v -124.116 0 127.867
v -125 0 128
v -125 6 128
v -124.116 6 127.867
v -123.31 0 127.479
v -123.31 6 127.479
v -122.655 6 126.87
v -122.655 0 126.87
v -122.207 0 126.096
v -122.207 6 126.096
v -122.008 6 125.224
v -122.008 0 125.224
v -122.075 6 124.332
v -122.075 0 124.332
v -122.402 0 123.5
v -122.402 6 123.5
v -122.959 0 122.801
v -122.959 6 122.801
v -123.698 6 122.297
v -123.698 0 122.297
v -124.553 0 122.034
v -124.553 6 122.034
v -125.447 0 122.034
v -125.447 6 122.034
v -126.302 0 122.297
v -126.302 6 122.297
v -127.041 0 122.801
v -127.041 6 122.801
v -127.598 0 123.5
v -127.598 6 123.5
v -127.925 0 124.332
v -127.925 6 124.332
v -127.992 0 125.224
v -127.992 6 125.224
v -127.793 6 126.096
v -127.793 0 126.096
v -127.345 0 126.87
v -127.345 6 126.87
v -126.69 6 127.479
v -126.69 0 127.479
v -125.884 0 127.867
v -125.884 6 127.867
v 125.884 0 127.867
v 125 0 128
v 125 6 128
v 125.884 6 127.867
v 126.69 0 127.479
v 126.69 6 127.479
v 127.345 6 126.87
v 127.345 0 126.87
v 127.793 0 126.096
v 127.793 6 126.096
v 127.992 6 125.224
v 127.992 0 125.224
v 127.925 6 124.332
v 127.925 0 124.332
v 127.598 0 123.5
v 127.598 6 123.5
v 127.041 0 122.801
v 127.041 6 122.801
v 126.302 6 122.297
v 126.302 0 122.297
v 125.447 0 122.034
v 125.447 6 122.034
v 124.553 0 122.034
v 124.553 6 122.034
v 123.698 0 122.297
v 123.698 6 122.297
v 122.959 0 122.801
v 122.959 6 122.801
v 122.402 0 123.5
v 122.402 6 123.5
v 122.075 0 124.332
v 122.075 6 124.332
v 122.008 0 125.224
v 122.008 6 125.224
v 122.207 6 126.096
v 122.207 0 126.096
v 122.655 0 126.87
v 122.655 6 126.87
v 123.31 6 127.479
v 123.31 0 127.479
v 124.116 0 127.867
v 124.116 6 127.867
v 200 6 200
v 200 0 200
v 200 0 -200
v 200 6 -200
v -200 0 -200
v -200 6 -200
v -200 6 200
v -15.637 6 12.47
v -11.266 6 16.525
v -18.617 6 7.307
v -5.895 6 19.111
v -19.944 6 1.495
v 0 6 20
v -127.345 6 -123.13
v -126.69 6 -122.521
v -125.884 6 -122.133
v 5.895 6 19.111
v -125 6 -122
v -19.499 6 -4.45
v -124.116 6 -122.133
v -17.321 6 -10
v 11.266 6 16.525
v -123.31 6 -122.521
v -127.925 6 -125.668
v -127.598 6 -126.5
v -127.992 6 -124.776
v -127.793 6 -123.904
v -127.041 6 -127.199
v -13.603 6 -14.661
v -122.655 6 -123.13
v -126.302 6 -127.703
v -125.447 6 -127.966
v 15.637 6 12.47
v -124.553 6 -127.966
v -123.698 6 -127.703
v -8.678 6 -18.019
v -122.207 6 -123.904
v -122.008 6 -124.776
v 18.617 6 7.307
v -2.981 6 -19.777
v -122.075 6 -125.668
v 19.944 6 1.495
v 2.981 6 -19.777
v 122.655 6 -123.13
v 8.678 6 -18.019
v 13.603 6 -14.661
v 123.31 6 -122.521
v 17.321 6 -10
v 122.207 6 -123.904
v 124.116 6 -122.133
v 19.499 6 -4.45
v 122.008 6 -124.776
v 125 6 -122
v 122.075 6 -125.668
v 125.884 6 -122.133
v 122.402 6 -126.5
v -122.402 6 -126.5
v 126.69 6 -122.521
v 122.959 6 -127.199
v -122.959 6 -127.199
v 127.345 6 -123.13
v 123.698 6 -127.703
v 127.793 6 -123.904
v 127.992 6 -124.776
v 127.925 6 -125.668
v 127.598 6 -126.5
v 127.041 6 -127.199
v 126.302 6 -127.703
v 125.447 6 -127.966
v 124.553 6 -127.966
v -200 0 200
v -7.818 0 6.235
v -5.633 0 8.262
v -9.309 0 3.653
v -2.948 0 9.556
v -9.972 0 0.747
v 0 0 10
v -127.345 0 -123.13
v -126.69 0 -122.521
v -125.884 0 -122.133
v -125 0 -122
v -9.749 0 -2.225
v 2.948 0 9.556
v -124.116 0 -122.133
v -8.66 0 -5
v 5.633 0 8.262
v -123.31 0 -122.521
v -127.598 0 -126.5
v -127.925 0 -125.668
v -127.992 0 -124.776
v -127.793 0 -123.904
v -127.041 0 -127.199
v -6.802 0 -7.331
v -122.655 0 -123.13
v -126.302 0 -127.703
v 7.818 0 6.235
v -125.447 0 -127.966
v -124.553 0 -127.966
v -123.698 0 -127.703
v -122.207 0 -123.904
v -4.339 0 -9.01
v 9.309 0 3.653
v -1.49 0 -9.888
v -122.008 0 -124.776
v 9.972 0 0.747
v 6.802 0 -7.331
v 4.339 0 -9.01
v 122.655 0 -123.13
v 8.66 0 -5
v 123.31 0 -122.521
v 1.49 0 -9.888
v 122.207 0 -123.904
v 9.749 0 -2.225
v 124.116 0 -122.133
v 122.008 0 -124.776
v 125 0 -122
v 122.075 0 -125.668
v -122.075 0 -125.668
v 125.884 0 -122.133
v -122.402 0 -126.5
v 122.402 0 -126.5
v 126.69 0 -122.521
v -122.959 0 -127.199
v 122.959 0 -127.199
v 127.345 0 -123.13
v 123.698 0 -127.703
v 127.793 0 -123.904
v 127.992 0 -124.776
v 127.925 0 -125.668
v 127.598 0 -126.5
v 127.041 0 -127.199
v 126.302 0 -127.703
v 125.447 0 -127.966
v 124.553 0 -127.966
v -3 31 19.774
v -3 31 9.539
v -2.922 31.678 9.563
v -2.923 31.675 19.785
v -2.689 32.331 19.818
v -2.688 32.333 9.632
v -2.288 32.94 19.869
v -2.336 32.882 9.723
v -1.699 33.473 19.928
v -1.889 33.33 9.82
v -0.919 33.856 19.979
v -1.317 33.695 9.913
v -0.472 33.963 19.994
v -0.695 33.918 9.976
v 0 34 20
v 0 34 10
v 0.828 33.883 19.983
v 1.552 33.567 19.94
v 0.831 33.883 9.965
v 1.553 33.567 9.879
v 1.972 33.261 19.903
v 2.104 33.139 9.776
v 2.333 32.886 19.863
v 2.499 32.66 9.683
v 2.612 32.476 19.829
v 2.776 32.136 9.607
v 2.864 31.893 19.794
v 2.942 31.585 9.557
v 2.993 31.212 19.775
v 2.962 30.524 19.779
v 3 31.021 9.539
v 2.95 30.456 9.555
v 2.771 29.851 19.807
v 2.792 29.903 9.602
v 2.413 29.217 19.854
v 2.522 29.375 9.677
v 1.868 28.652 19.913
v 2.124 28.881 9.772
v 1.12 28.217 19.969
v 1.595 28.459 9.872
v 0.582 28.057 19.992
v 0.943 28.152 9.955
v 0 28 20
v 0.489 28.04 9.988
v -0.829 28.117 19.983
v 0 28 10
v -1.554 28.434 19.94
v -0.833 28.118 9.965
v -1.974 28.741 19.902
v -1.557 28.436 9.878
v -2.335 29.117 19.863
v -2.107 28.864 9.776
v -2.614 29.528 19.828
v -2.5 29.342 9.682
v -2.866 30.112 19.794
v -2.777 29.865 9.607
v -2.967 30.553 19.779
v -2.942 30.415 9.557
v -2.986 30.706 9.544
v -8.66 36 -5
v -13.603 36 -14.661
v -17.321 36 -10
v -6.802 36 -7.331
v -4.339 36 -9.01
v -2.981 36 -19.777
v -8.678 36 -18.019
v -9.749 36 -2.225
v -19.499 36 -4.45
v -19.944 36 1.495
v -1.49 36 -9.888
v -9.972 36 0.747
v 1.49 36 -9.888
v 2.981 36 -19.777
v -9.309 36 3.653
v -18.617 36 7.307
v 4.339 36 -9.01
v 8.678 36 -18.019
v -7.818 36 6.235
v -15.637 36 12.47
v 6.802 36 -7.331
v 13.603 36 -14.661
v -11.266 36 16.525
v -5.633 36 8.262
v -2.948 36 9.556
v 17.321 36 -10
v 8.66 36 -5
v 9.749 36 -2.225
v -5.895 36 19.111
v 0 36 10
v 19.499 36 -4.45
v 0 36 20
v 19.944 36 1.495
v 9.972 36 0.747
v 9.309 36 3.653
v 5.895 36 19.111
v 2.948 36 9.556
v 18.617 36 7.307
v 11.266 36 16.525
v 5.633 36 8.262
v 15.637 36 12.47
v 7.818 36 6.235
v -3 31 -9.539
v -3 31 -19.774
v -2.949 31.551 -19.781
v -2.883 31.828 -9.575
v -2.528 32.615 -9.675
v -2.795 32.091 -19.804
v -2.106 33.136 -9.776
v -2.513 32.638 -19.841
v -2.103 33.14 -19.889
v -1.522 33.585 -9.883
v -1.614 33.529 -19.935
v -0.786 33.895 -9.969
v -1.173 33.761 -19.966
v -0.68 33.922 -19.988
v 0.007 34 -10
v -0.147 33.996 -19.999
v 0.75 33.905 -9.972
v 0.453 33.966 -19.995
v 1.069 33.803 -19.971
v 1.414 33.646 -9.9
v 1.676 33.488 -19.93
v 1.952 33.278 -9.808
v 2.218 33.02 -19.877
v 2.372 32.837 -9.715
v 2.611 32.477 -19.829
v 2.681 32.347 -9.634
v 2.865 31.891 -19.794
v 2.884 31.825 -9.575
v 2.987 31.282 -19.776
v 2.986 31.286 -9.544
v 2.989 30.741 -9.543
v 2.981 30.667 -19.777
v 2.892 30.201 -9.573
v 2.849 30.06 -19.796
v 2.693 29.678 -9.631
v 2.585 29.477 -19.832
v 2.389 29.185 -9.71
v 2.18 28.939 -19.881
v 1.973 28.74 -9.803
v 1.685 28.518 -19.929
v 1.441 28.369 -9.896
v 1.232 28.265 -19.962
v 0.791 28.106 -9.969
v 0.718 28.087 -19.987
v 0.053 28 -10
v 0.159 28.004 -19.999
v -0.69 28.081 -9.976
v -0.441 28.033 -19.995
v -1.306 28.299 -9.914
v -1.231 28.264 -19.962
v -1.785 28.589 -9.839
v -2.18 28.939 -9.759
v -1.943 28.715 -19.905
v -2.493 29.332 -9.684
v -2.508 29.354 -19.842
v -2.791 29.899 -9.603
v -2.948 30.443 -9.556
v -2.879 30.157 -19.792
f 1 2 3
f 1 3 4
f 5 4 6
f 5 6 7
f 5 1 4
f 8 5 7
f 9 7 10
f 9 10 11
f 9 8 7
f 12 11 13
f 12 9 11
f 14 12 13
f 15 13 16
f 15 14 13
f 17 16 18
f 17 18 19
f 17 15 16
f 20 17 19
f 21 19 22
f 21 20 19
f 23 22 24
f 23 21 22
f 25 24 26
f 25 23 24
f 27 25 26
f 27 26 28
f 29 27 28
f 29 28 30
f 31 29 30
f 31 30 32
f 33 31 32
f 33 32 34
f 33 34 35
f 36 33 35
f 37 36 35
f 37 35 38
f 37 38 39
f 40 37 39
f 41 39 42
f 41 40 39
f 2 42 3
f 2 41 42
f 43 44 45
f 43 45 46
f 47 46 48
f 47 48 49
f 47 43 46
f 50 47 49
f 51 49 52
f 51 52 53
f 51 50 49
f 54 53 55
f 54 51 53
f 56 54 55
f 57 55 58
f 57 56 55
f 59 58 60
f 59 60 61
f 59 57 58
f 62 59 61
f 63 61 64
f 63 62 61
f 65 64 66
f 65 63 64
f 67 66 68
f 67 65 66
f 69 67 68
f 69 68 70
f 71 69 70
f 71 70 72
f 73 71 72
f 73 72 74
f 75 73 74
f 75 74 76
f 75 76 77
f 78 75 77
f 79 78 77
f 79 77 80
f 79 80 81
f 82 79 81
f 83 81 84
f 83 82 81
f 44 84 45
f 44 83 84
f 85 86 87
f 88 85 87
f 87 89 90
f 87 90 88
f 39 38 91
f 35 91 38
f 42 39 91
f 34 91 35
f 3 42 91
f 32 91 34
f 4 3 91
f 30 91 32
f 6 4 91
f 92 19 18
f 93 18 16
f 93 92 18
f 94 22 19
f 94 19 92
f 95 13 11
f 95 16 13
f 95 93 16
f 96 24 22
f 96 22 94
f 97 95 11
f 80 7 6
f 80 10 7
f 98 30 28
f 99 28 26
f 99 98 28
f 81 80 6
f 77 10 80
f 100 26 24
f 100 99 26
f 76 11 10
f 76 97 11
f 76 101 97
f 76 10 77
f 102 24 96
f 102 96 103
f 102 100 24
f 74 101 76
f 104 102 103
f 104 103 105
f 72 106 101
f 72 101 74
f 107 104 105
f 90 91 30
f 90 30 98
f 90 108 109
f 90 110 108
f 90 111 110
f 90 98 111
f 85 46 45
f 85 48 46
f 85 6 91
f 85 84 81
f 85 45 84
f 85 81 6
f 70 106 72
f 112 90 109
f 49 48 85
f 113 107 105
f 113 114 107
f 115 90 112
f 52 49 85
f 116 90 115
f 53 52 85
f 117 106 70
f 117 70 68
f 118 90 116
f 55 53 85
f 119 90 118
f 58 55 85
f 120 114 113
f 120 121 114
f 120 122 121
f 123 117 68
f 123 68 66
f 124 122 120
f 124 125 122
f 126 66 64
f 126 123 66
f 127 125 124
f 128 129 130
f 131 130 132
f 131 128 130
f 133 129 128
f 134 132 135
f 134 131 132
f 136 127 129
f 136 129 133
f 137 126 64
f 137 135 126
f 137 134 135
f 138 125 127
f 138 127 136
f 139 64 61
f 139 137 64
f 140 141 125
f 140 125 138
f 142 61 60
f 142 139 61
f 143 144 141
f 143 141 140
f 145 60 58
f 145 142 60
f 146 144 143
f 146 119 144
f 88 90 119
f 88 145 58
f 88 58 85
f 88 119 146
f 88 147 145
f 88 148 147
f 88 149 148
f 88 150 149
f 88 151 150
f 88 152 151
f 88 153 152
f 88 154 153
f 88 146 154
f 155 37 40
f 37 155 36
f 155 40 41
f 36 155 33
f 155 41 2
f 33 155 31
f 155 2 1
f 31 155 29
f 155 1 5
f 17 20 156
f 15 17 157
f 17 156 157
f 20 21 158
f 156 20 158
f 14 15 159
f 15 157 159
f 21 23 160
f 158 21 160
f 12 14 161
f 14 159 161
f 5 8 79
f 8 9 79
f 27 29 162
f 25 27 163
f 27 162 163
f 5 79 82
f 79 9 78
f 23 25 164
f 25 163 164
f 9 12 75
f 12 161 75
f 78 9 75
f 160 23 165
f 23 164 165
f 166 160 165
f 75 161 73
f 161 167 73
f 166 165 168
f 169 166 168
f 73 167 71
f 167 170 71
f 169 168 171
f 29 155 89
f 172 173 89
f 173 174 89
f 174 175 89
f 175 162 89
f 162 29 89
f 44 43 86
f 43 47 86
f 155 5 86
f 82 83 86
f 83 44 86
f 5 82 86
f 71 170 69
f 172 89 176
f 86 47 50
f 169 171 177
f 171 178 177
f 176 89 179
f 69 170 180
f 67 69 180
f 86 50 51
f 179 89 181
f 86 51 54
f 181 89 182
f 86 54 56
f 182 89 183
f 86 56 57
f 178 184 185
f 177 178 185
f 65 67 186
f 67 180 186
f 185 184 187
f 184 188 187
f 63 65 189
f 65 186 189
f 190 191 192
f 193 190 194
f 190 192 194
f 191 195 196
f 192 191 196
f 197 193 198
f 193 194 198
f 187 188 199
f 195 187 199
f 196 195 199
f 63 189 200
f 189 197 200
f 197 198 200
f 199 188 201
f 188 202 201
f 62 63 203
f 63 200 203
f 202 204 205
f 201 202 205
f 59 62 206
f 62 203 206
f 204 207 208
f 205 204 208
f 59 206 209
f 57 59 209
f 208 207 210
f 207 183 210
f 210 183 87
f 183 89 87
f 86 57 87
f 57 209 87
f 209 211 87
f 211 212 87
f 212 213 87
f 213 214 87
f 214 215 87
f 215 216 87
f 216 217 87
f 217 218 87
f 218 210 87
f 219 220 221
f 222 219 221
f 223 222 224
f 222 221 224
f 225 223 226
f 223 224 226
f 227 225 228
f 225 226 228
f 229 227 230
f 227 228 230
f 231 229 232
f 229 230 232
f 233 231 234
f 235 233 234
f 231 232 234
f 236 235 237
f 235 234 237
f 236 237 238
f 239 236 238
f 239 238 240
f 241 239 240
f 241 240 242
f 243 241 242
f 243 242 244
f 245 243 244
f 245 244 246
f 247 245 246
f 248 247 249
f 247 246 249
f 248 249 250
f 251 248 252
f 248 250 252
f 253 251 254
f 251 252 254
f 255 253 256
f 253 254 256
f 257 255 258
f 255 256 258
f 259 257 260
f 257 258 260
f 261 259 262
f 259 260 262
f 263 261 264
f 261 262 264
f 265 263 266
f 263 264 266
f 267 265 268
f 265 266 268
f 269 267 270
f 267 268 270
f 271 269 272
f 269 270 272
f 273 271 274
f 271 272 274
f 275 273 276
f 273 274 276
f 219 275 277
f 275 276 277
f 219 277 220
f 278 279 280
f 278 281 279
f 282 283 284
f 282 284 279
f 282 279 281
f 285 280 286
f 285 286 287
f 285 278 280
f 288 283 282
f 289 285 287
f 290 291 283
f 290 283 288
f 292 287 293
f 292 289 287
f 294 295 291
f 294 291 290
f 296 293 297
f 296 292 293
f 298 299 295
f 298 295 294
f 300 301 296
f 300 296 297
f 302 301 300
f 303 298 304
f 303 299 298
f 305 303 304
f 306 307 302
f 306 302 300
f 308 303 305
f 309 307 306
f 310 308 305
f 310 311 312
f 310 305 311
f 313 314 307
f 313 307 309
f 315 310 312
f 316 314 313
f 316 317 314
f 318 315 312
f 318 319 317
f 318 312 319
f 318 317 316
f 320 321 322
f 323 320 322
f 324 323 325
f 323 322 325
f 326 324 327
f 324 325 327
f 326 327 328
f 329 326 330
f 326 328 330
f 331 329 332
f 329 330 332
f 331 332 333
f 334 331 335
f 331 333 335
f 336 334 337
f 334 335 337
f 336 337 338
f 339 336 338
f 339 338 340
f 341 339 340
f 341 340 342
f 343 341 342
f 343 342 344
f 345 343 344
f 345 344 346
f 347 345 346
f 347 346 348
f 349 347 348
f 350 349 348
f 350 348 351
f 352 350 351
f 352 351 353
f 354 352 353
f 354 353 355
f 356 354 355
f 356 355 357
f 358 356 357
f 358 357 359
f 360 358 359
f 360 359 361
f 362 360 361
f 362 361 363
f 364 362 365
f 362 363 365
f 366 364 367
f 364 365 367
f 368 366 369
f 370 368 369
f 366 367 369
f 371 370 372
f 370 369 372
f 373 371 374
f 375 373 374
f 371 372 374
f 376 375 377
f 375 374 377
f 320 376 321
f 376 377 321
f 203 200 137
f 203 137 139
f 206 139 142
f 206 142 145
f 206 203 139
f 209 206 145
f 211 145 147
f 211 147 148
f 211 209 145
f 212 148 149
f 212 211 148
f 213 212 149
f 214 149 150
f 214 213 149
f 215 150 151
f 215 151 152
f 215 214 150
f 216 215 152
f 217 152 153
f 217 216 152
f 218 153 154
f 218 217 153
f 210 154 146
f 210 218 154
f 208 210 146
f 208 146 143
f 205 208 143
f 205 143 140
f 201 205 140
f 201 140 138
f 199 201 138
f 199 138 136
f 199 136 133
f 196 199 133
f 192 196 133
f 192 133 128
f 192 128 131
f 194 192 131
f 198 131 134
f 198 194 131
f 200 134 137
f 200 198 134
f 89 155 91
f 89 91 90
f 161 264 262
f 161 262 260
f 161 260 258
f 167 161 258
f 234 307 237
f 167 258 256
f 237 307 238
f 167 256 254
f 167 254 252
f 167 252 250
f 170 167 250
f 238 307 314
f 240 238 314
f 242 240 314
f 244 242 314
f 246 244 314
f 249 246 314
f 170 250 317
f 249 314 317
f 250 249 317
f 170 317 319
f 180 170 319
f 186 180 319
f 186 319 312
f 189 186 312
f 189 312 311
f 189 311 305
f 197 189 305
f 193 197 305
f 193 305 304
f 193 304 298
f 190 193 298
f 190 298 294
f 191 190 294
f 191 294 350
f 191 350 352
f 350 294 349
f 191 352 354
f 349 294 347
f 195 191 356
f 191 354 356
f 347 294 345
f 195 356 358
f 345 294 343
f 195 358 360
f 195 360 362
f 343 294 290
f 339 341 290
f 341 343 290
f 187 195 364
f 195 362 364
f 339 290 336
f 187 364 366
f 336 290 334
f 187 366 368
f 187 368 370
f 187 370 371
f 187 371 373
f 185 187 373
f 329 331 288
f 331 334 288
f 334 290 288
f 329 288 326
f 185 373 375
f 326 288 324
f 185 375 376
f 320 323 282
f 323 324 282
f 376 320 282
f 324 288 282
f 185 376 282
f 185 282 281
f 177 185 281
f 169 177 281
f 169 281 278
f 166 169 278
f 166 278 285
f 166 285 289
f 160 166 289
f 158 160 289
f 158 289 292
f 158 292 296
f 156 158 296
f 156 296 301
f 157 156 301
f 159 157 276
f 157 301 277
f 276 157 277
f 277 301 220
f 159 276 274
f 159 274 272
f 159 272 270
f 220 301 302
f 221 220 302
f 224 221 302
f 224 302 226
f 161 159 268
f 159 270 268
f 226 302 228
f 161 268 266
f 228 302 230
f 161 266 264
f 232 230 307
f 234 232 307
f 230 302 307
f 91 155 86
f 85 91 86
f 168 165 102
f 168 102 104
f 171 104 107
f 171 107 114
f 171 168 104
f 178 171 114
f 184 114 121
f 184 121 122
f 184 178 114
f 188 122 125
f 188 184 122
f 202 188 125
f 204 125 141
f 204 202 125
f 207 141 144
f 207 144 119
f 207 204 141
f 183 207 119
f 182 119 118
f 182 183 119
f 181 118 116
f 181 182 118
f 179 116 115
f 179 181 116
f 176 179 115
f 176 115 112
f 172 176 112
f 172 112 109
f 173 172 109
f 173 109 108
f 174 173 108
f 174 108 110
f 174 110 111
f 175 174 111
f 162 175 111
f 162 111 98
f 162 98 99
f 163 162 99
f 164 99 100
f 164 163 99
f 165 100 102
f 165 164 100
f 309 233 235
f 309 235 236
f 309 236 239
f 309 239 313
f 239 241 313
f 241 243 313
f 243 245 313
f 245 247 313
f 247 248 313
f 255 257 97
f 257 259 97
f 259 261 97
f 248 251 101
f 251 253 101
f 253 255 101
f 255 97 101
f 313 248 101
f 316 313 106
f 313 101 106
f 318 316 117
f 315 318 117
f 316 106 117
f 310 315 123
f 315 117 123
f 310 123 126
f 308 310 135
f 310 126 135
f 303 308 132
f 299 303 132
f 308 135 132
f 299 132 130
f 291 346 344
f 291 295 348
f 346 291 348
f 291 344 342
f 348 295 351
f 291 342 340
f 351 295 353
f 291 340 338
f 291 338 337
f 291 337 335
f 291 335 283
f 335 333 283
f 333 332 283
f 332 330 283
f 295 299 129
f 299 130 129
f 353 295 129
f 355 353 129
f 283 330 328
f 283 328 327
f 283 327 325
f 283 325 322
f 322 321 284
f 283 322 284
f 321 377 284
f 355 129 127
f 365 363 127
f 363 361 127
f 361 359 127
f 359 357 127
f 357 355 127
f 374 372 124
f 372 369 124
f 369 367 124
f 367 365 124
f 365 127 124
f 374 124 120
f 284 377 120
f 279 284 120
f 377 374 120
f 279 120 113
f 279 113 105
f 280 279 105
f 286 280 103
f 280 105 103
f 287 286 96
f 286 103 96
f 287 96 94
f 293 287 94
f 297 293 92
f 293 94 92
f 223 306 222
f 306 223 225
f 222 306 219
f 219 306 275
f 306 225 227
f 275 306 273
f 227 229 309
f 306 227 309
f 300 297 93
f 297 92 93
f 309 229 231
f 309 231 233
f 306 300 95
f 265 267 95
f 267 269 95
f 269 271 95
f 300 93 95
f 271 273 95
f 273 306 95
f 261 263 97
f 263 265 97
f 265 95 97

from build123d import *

# Parameters (mm, degrees)
SKETCH_1_W          = 400
SKETCH_1_H          = 400
SKETCH_1_R          = 3
EXTRUDE_1_DEPTH     = 6
SKETCH_2_R          = 20
EXTRUDE_2_DEPTH     = 30
SKETCH_3_R          = 10
CUT_EXTRUDE_1_DEPTH = 286.124534195
SKETCH_4_R          = 3
CUT_EXTRUDE_2_DEPTH = 300.492904757


with BuildPart() as part:
    # 草图1 → 凸台-拉伸1 (new body)
    with BuildSketch(Plane(origin=(0, 0, 0), x_dir=(1, 0, 0), z_dir=(0, 1, 0))):
        Rectangle(SKETCH_1_W, SKETCH_1_H)
        with Locations(Location((-125, 125, 0), (0, 0, 270))):
            Circle(SKETCH_1_R, mode=Mode.SUBTRACT)
        with Locations(Location((125, 125, 0), (0, 0, 270))):
            Circle(SKETCH_1_R, mode=Mode.SUBTRACT)
        with Locations(Location((125, -125, 0), (0, 0, 270))):
            Circle(SKETCH_1_R, mode=Mode.SUBTRACT)
        with Locations(Location((-125, -125, 0), (0, 0, 270))):
            Circle(SKETCH_1_R, mode=Mode.SUBTRACT)
    extrude(amount=EXTRUDE_1_DEPTH)

    # 草图2 → 凸台-拉伸2 (add)
    with BuildSketch(Plane(origin=(0, 6, 0), x_dir=(1, 0, 0), z_dir=(0, 1, 0))):
        with Locations(Location((0, 0, 0), (0, 0, 270))):
            Circle(SKETCH_2_R)
    extrude(amount=EXTRUDE_2_DEPTH)

    # 草图3 → 切除-拉伸1 (cut, through all)
    with BuildSketch(Plane(origin=(0, 36, 0), x_dir=(1, 0, 0), z_dir=(0, 1, 0))):
        with Locations(Location((0, 0, 0), (0, 0, 270))):
            Circle(SKETCH_3_R)
    extrude(amount=-CUT_EXTRUDE_1_DEPTH, mode=Mode.SUBTRACT)

    # 草图4 → 切除-拉伸2 (cut, through all)
    with BuildSketch(Plane(origin=(0, 0, -20), x_dir=(-1, 0, 0), z_dir=(0, 0, -1))):
        with Locations((0, 31)):
            Circle(SKETCH_4_R)
    extrude(amount=-CUT_EXTRUDE_2_DEPTH, mode=Mode.SUBTRACT)


solid = part.part
